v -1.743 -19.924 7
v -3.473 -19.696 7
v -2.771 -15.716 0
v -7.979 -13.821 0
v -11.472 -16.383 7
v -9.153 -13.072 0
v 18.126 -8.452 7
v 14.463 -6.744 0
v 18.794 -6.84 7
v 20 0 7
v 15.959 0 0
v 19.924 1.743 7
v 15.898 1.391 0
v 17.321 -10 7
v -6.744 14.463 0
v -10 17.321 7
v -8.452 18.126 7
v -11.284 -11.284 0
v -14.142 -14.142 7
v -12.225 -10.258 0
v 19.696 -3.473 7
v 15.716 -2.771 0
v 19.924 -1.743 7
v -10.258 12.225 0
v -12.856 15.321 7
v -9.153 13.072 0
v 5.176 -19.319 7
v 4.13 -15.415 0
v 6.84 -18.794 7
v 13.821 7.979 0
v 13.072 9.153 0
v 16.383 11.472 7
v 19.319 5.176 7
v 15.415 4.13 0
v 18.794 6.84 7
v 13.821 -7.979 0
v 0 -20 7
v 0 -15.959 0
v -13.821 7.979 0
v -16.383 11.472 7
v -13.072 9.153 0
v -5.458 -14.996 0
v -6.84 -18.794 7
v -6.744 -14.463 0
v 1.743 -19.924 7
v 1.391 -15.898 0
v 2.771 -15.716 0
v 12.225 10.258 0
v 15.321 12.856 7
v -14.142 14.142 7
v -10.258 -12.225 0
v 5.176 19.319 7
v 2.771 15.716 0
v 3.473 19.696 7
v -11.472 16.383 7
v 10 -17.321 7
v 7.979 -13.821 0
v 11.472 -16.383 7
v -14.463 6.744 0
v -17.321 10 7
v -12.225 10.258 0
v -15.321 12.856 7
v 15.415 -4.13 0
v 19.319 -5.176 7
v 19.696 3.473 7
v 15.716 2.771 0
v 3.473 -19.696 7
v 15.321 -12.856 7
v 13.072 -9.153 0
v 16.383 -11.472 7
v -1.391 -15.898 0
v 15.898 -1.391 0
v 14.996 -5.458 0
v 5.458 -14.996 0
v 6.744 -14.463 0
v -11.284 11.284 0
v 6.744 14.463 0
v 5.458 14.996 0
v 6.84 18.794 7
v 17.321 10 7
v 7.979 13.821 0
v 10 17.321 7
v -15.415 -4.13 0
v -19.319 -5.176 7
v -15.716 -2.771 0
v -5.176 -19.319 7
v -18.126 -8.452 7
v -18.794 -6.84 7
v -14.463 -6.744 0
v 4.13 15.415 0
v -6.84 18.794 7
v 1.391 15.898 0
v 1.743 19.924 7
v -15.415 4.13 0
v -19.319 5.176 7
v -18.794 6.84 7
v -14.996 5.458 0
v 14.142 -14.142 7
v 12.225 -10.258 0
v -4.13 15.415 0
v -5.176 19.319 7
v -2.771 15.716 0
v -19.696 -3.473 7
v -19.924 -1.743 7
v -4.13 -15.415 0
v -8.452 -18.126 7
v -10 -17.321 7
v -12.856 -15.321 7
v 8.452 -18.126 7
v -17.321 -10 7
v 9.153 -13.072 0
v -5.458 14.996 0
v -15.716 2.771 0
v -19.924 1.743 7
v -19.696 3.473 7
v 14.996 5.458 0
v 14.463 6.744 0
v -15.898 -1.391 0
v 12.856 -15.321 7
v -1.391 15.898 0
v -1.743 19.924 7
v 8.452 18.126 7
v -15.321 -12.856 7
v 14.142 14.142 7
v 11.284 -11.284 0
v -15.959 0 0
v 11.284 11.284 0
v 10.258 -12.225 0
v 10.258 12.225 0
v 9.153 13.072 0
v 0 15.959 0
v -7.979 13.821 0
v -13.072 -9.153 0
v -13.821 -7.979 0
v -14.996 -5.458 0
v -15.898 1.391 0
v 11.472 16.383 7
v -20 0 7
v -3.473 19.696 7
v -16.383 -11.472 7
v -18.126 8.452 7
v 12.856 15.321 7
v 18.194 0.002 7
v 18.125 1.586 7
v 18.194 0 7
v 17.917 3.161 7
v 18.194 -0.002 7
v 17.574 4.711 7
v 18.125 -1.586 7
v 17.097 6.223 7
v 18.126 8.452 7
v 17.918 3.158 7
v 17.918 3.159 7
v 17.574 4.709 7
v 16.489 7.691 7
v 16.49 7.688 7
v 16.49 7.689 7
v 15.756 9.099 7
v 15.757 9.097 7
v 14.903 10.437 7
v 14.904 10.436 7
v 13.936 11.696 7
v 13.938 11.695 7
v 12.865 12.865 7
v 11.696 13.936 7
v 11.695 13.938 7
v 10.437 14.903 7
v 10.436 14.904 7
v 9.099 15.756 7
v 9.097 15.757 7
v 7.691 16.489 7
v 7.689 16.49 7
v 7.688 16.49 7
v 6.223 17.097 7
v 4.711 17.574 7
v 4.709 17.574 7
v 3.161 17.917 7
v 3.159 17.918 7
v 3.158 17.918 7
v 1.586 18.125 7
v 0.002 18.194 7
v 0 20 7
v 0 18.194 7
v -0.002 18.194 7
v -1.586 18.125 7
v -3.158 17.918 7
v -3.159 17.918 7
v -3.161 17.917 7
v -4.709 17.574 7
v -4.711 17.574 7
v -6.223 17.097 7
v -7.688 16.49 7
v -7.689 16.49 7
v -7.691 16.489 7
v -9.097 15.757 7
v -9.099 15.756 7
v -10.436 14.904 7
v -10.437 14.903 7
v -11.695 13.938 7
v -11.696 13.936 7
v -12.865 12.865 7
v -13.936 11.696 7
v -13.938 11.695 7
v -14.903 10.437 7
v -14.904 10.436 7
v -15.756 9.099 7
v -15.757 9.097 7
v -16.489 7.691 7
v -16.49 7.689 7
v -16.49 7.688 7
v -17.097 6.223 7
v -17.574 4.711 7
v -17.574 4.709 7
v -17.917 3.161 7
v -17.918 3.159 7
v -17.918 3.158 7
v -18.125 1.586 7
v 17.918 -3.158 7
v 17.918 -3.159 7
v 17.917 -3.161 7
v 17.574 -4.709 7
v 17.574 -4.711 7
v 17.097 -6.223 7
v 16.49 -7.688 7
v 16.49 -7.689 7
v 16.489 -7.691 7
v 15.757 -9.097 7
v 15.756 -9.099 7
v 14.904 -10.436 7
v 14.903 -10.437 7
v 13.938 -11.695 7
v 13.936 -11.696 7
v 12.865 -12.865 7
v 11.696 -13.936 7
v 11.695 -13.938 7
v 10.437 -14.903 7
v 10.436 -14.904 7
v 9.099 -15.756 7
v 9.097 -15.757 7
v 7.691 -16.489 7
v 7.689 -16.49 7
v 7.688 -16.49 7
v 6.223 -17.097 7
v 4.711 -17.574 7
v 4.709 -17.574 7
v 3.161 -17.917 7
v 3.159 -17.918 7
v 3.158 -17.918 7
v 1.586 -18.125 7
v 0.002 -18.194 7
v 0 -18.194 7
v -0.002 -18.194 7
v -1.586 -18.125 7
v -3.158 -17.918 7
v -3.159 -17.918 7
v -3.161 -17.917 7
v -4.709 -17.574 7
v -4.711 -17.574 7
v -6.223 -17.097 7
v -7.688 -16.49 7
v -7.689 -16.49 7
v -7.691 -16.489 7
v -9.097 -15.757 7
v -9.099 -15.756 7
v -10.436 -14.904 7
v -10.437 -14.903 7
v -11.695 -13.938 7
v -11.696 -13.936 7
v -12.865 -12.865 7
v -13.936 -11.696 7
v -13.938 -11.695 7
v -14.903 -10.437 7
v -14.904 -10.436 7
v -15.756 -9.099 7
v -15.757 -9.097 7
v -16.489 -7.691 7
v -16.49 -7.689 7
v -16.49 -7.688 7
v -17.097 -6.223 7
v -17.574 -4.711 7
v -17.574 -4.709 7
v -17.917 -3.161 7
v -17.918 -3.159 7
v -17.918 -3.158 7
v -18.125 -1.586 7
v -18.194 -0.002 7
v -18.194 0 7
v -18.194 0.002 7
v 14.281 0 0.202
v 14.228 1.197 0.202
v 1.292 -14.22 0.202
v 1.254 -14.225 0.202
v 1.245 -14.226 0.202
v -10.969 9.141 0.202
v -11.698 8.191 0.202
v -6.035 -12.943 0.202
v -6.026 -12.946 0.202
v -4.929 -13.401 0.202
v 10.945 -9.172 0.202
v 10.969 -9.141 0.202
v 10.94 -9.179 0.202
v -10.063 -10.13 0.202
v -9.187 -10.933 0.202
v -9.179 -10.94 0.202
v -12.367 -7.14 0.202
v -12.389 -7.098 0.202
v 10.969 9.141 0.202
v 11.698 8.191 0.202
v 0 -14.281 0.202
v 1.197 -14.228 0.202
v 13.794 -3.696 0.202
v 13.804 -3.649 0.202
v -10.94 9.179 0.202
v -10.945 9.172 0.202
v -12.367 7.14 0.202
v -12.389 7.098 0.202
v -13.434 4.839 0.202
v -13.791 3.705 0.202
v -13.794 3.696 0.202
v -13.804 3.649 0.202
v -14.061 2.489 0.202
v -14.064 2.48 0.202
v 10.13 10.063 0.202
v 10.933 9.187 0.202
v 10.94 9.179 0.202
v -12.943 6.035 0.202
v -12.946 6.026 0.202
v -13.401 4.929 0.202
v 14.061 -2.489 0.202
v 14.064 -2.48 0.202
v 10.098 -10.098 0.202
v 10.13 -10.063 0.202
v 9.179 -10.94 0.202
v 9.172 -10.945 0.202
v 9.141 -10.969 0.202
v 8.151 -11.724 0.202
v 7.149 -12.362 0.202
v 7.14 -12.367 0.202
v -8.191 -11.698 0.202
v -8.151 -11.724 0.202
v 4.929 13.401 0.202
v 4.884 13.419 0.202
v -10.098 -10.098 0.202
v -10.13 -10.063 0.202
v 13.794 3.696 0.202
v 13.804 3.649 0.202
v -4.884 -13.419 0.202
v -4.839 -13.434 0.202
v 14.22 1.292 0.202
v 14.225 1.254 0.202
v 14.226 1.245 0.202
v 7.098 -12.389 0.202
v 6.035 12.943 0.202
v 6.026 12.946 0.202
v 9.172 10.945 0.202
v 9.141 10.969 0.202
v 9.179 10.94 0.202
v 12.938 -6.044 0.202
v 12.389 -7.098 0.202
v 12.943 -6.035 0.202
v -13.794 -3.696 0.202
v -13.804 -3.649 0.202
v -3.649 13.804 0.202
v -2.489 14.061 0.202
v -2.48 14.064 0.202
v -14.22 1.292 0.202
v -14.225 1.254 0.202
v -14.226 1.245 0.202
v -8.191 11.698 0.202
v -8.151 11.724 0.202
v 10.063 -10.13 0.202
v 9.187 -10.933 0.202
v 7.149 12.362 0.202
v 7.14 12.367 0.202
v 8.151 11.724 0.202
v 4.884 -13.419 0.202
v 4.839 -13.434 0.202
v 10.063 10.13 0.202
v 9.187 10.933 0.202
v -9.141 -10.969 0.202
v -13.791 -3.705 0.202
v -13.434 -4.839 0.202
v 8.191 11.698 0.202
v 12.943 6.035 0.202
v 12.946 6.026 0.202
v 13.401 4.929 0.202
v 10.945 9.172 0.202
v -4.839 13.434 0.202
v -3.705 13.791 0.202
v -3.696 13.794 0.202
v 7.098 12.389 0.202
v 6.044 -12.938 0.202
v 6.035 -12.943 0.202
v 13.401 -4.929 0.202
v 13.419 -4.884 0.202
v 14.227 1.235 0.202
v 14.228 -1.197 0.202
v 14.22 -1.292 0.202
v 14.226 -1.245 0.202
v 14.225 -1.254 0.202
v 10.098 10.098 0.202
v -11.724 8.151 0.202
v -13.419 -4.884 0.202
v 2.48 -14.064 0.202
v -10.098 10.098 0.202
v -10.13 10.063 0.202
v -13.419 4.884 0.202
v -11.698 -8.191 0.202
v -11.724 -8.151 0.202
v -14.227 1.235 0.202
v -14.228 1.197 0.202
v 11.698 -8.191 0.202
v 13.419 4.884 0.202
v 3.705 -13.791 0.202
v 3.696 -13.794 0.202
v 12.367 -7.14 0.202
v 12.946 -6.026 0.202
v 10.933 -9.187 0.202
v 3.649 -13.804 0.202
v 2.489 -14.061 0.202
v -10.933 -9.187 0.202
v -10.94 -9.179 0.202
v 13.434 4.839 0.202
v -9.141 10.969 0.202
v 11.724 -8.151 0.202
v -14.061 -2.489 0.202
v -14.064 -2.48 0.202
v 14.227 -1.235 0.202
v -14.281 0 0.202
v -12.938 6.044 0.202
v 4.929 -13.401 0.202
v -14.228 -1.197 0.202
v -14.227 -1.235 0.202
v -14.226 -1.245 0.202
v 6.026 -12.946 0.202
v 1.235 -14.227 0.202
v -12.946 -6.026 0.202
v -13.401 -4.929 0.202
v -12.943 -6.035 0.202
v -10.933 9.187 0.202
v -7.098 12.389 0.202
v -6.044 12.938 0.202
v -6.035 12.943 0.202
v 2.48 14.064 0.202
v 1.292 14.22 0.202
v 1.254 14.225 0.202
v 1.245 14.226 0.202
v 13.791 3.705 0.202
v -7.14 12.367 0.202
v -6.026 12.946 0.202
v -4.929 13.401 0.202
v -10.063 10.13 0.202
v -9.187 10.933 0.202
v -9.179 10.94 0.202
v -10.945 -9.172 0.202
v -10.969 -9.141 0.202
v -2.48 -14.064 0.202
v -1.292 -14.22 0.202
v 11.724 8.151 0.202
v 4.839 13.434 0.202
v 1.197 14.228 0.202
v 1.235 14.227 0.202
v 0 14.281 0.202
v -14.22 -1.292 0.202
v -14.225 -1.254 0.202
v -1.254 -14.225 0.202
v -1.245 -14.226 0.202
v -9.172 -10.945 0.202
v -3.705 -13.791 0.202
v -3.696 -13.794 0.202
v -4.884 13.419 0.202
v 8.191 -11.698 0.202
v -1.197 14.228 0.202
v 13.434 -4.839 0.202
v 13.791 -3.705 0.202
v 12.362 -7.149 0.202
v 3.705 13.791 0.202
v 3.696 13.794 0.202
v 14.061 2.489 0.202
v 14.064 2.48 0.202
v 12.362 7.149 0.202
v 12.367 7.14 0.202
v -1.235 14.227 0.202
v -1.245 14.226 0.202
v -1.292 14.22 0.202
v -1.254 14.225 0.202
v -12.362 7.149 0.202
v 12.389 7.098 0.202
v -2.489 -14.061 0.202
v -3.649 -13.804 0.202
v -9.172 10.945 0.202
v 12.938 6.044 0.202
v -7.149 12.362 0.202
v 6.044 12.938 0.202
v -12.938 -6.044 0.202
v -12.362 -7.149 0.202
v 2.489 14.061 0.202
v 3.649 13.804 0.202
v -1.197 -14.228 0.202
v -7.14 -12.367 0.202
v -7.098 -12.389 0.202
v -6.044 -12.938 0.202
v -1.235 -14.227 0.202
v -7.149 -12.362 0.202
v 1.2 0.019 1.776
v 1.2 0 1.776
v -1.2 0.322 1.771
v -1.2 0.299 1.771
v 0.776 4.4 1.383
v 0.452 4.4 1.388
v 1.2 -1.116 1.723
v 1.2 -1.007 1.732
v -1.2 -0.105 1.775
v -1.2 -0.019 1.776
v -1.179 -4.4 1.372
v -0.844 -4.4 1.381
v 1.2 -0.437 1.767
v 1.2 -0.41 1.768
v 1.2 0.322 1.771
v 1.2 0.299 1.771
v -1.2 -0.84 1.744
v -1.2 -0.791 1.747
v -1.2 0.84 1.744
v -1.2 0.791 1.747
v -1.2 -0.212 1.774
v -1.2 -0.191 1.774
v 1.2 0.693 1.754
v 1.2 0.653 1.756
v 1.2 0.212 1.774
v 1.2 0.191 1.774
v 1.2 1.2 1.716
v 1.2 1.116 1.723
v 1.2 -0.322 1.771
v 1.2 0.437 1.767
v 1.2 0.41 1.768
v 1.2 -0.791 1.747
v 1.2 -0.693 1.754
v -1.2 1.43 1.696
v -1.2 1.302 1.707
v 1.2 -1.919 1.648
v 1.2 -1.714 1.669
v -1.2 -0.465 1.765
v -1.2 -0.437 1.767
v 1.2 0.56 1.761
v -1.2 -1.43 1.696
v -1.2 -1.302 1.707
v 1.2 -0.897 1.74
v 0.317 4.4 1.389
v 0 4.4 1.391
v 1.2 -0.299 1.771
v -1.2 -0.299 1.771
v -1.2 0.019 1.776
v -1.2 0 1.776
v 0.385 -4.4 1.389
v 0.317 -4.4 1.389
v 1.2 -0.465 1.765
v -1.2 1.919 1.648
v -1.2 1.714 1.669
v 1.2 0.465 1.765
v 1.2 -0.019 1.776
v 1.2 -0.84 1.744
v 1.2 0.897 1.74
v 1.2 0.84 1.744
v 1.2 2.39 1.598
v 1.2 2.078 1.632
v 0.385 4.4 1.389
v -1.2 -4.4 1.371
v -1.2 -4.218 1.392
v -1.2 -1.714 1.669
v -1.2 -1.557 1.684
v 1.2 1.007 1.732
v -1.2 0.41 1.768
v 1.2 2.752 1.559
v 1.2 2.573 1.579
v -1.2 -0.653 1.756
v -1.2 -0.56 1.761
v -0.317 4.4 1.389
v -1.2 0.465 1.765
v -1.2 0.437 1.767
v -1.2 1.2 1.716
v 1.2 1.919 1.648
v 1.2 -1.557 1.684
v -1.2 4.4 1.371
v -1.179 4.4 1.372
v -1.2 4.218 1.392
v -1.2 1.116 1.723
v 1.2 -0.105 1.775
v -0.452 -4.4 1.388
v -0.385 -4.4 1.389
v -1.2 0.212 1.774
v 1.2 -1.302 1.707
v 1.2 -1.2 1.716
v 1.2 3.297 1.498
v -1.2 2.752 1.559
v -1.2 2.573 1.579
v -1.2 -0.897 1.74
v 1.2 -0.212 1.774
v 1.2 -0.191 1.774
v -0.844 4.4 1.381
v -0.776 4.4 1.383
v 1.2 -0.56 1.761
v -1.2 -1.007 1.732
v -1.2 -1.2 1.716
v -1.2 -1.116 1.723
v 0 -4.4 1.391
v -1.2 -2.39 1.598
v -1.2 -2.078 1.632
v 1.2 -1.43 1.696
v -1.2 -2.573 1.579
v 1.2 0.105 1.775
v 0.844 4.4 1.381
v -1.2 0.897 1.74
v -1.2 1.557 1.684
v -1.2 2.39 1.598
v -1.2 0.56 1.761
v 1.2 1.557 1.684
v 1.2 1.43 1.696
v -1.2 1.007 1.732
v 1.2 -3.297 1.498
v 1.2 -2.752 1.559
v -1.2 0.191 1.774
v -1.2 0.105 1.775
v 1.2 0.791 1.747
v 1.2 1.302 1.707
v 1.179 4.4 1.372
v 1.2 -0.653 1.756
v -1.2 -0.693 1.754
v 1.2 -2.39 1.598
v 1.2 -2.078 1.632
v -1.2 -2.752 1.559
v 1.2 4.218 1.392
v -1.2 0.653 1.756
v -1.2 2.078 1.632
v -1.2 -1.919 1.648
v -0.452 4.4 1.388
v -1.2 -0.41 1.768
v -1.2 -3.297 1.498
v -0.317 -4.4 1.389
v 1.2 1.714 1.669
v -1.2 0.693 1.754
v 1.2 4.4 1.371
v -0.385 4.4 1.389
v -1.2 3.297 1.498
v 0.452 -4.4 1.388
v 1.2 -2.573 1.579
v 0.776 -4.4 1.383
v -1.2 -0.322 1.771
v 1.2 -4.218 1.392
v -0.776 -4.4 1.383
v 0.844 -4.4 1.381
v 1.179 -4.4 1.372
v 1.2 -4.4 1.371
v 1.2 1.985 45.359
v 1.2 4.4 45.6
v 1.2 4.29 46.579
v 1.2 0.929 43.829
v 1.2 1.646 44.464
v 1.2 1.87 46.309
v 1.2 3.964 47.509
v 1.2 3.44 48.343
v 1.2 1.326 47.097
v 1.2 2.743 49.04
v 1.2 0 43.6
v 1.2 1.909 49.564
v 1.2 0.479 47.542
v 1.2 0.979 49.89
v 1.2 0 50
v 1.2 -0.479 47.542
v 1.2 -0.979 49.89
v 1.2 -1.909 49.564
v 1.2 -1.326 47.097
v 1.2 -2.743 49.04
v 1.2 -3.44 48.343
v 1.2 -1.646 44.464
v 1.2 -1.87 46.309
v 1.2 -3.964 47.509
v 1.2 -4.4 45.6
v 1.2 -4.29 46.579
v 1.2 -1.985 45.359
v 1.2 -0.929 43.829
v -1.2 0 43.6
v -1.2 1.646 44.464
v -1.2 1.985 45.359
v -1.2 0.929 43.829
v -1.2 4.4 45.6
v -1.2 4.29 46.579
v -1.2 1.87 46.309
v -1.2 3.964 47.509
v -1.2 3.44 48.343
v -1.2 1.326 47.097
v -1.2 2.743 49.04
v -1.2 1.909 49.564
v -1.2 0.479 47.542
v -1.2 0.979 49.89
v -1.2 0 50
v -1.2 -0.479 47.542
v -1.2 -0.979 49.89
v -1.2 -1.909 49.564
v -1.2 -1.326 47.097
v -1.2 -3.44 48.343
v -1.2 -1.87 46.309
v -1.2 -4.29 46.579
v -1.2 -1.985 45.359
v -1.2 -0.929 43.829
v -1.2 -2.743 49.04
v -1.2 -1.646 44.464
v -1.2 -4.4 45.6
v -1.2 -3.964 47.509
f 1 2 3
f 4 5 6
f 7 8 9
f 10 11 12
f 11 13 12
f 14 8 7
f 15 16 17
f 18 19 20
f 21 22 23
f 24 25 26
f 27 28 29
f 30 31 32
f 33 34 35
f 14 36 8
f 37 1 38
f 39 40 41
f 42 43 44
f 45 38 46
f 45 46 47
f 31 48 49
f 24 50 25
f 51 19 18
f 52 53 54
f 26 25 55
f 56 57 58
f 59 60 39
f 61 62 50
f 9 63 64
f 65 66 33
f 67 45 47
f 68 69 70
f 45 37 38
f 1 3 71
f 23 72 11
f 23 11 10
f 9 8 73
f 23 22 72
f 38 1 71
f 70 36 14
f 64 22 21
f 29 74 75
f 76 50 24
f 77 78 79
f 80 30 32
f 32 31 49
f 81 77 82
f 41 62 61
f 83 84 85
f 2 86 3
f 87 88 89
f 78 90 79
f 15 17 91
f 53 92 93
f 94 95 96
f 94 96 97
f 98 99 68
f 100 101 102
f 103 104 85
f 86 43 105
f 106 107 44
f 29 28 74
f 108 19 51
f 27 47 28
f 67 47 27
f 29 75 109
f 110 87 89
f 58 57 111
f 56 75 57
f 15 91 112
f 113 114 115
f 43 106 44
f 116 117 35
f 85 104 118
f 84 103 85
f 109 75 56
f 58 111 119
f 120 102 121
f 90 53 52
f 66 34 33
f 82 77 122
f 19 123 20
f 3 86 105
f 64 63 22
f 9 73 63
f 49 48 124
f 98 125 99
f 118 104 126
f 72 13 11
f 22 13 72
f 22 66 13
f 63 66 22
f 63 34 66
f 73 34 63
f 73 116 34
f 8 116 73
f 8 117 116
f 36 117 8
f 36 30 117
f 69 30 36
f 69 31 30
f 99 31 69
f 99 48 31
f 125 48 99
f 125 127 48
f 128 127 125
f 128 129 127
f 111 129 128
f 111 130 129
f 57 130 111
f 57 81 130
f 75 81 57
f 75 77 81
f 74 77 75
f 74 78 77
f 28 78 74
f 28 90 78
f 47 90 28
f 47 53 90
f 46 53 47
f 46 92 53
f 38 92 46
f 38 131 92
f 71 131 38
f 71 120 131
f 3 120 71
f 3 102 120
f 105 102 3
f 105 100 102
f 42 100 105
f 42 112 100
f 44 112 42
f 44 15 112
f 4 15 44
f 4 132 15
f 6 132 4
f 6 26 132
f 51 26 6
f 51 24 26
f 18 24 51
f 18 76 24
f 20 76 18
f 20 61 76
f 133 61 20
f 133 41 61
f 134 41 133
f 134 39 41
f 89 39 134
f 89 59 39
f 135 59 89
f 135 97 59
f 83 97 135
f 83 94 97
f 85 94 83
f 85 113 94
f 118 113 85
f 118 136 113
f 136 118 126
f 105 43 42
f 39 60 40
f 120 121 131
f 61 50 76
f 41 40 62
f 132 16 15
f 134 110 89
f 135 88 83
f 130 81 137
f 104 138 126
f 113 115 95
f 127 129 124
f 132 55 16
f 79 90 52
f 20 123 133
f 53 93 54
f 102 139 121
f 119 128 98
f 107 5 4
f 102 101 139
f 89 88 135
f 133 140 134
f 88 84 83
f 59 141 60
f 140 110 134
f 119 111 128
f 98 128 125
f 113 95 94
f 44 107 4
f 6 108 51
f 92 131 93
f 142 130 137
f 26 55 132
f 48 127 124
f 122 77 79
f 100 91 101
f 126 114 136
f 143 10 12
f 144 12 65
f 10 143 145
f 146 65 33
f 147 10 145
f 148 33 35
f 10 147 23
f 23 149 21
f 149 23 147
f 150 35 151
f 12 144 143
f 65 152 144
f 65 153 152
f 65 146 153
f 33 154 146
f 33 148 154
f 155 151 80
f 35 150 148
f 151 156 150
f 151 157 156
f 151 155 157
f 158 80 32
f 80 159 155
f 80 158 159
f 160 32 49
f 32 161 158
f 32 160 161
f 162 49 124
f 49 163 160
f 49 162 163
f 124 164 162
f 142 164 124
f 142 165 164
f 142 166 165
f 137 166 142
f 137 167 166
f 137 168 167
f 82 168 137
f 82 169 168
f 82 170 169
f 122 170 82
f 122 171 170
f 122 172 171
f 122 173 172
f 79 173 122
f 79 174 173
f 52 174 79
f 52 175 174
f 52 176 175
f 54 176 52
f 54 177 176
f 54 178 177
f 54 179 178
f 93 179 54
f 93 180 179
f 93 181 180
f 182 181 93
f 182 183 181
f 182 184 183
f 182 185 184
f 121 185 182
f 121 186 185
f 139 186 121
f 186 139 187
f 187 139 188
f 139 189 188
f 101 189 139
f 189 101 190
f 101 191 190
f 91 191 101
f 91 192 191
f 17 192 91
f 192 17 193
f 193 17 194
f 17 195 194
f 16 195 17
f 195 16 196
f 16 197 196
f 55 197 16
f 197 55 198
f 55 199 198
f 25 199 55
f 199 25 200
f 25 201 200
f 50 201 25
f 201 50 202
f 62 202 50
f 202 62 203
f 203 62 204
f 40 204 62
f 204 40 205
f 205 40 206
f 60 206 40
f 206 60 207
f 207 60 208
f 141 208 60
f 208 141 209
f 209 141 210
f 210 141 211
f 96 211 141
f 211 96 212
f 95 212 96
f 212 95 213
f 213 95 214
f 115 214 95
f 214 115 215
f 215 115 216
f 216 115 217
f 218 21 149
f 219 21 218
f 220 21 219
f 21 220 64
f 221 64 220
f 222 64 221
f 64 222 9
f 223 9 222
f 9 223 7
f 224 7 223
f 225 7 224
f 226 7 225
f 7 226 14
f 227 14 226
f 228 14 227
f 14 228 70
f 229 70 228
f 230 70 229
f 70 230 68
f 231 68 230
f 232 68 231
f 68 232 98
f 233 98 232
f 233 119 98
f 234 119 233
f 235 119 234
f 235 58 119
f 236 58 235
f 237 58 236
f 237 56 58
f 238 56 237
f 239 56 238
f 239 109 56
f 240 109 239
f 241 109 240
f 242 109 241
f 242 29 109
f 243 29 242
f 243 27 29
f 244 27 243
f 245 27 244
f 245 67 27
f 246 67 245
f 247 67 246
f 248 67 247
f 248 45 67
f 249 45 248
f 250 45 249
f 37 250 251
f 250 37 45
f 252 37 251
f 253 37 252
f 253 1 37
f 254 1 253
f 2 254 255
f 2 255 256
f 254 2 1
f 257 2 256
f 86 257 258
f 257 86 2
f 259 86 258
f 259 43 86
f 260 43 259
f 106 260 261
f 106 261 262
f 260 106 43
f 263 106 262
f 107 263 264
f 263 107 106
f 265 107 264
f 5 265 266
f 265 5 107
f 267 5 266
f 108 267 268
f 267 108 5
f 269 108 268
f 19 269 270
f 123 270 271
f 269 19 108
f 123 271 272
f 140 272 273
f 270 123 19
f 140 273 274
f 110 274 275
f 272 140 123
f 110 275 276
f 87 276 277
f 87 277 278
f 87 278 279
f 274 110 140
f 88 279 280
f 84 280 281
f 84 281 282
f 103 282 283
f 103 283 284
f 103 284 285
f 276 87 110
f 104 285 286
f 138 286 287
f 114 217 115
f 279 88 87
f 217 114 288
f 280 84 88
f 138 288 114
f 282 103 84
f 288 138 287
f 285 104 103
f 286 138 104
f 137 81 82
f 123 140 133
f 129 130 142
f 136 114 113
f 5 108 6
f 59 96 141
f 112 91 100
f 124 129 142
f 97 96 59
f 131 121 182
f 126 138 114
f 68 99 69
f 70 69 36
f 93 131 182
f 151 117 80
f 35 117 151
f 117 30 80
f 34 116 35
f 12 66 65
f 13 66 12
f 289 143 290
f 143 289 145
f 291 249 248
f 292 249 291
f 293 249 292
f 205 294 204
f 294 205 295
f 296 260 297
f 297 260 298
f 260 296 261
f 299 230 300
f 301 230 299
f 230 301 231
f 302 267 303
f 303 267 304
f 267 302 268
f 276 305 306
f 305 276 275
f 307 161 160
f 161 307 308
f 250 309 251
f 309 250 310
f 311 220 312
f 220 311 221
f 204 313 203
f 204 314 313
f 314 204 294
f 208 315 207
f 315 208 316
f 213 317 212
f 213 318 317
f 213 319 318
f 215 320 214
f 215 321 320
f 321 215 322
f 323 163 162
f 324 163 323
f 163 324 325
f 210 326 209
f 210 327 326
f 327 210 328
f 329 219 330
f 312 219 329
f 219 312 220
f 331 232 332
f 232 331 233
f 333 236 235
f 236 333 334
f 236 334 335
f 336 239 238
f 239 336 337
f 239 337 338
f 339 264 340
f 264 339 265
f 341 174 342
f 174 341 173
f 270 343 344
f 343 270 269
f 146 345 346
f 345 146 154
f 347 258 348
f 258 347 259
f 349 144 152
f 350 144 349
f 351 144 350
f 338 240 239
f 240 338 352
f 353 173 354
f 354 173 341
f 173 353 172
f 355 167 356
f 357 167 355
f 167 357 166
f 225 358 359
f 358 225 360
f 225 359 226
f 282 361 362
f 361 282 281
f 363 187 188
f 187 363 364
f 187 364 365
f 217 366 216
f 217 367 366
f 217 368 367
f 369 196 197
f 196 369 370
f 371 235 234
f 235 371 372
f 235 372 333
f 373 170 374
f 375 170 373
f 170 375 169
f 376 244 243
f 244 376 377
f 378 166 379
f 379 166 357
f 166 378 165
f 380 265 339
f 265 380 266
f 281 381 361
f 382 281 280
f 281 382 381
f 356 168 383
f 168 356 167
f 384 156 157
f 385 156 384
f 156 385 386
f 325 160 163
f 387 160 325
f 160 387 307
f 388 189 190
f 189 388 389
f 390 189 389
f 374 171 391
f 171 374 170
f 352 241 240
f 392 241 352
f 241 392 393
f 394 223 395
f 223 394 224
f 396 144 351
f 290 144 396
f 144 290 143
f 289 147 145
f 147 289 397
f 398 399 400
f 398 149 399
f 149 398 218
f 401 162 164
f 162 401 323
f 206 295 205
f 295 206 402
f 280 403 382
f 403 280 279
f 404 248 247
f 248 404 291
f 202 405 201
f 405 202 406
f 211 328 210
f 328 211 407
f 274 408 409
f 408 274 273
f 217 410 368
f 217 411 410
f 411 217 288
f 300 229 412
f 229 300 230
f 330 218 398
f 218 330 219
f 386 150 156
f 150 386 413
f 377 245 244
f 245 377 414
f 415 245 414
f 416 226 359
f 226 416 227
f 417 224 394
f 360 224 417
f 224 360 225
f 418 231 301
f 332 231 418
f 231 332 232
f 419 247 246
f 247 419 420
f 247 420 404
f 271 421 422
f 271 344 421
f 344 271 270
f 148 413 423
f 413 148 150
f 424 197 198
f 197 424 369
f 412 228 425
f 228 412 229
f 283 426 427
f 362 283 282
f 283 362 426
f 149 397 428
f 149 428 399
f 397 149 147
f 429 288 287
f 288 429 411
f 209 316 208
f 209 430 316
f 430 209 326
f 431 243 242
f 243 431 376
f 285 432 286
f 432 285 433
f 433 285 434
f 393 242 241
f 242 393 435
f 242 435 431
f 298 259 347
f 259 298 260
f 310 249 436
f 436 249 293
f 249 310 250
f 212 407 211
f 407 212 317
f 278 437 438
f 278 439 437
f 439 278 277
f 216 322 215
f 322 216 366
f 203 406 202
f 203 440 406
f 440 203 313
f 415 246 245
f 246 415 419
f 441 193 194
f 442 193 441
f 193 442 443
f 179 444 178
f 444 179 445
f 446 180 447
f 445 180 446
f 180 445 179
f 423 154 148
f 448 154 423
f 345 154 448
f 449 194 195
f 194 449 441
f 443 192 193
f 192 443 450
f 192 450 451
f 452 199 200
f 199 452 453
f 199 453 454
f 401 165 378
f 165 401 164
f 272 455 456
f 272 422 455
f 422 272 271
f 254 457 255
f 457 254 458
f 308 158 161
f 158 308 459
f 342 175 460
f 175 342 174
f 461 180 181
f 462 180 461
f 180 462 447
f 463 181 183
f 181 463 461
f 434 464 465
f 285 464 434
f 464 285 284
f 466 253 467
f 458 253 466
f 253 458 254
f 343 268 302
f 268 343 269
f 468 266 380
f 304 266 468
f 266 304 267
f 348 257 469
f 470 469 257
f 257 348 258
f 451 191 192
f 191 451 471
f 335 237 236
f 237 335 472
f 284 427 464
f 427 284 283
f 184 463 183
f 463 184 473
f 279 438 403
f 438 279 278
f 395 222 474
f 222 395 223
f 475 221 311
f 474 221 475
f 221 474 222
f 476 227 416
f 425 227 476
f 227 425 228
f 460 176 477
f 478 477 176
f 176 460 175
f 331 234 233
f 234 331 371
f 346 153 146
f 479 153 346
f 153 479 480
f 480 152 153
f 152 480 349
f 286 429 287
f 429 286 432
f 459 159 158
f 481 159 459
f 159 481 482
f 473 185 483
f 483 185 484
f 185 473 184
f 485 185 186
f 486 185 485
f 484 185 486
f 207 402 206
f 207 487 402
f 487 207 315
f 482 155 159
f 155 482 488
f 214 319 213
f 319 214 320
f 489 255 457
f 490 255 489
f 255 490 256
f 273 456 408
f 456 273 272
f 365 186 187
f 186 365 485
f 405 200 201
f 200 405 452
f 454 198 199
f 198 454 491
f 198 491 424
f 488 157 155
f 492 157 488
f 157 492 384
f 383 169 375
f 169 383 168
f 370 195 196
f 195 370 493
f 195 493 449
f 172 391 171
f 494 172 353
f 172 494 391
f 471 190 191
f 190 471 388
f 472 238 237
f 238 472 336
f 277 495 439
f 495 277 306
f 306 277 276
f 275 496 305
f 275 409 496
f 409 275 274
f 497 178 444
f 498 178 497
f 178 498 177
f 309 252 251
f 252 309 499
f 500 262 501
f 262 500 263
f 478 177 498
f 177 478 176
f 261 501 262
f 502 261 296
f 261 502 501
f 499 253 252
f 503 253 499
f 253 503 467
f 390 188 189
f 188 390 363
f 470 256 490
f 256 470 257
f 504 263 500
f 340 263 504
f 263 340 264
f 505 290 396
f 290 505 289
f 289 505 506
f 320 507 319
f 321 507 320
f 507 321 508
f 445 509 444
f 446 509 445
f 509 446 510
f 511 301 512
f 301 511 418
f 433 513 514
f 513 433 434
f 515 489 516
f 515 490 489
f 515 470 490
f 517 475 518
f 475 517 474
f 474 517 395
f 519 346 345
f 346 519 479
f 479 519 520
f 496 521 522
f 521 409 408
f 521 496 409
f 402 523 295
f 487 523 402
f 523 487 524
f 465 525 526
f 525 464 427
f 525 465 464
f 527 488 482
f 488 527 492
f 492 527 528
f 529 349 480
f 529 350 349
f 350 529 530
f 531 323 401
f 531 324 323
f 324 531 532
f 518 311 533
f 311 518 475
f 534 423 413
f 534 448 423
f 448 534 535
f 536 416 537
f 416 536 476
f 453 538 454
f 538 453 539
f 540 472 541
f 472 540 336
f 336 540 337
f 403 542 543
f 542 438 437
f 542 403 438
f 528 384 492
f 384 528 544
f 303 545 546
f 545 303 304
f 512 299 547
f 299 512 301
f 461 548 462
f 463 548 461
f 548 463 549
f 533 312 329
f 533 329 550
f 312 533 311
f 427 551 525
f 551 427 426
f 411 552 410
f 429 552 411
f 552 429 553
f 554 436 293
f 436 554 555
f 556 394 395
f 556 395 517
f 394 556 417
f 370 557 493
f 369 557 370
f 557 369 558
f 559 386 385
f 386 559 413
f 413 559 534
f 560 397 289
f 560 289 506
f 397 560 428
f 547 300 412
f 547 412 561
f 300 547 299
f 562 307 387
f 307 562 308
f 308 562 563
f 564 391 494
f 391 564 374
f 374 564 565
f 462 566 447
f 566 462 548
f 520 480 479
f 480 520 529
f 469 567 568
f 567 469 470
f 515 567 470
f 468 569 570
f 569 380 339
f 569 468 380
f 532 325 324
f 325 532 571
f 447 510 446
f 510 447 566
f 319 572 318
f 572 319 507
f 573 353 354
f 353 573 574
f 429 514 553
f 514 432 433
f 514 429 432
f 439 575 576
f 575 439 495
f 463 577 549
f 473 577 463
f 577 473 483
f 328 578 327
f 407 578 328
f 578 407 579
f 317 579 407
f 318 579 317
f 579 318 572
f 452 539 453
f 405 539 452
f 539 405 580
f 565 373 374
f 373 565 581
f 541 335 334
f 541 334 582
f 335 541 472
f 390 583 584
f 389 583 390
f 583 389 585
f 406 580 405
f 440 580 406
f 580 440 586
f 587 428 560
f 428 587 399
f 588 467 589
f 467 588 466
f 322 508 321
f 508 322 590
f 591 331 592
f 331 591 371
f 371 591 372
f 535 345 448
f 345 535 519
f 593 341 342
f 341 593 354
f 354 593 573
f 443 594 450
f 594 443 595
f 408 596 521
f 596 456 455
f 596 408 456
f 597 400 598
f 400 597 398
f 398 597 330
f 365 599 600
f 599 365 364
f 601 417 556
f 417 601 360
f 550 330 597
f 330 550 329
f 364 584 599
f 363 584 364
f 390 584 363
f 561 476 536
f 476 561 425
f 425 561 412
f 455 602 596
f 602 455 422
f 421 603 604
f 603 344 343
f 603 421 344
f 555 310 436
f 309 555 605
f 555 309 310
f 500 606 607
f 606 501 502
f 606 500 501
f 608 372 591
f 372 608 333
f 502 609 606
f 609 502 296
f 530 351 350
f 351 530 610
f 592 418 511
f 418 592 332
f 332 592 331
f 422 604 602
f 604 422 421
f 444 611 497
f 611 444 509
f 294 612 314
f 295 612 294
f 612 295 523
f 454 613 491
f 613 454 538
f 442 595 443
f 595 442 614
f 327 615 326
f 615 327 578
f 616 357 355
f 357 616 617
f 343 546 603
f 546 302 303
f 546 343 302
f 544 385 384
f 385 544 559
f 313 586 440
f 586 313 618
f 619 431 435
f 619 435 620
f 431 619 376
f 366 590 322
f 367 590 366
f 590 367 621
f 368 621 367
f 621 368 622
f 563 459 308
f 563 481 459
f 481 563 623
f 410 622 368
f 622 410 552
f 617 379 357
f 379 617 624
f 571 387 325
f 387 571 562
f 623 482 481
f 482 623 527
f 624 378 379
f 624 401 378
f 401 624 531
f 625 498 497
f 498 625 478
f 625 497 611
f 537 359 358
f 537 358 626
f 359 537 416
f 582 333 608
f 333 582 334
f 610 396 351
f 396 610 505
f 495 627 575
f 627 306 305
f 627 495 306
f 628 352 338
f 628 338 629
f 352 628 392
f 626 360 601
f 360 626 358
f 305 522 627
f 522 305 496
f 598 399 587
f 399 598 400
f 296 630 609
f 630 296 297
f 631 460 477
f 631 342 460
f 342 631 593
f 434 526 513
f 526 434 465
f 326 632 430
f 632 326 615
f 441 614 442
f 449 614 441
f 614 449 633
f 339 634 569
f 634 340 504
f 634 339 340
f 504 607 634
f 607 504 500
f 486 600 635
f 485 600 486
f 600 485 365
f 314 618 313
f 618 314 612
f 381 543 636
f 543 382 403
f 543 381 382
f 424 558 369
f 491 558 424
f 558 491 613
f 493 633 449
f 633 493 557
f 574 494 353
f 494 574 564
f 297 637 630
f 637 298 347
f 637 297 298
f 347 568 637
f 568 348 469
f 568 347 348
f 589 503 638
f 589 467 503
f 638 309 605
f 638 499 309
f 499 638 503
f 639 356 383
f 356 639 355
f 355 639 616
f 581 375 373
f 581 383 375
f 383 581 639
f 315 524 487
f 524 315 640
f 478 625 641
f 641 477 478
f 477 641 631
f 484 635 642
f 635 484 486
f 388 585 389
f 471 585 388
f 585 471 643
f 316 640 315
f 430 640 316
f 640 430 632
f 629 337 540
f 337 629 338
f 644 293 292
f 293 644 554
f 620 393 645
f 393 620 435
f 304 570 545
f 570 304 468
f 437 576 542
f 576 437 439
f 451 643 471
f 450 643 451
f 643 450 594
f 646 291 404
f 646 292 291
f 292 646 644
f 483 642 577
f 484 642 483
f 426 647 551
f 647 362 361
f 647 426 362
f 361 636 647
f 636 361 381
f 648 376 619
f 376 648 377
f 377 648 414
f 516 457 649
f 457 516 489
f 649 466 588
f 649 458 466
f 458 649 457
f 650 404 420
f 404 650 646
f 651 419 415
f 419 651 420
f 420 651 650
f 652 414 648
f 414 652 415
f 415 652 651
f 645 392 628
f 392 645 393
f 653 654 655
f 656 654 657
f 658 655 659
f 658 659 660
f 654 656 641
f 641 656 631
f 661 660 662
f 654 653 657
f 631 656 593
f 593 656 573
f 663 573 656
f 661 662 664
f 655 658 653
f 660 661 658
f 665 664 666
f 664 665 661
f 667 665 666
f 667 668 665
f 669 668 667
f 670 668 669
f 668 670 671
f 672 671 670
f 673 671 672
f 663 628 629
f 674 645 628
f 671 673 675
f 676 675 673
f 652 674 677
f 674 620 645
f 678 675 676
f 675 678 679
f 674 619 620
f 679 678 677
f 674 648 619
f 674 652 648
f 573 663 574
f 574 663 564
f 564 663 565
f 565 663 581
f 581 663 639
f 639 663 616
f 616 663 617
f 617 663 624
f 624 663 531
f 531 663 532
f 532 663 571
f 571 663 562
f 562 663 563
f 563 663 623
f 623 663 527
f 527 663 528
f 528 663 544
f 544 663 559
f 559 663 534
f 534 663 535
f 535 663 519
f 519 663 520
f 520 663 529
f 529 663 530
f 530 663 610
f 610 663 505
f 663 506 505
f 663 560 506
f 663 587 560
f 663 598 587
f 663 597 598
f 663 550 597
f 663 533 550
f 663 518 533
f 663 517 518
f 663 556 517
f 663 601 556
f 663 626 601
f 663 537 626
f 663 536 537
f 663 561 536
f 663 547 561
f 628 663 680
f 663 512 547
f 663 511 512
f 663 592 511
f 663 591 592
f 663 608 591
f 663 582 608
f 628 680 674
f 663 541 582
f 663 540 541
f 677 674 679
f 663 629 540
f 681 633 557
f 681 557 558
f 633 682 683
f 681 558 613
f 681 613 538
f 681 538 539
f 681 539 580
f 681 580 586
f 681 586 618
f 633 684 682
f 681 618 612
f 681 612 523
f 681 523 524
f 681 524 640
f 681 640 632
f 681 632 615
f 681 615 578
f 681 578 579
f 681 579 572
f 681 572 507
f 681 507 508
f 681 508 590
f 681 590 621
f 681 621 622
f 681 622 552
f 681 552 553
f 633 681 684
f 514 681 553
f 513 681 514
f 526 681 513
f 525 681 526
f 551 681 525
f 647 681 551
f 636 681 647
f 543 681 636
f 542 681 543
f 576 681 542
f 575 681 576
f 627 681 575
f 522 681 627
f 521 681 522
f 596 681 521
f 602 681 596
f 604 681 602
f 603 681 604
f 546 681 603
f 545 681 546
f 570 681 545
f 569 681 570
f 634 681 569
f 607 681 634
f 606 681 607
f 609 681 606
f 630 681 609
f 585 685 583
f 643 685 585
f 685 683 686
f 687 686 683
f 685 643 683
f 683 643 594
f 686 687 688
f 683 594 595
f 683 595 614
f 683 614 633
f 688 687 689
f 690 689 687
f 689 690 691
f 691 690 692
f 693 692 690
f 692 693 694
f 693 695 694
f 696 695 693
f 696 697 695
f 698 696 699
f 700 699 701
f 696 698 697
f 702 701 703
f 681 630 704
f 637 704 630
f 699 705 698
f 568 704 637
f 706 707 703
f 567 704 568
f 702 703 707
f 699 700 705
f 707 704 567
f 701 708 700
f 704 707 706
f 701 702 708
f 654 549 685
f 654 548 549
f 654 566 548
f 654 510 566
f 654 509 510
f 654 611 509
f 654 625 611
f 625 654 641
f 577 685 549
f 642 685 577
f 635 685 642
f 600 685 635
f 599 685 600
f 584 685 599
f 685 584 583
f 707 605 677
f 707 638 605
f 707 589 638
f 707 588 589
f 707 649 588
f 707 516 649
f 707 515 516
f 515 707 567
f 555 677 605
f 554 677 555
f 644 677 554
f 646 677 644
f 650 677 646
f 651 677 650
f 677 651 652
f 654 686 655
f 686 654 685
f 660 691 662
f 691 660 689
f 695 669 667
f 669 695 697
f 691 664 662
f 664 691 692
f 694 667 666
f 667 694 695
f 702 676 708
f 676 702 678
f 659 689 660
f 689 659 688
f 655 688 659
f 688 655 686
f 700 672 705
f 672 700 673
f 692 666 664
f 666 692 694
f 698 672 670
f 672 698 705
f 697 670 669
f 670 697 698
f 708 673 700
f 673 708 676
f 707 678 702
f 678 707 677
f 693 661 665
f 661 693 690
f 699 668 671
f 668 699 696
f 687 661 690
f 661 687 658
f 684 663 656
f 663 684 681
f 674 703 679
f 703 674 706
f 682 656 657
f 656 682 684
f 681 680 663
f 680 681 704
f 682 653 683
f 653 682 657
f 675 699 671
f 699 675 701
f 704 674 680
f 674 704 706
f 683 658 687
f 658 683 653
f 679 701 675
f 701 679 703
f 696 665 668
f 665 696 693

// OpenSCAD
// -*- mode: SCAD ; c-file-style: "ellemtel" ; coding: utf-8 -*-
//
// simple, functional model mushroom anchor
//
// © 2018 Roland Sieker <ospalh@gmail.com>
// Licence: CC-BY-SA 4.0

// Radius of the cap
r = 20;

// size of the “chain” hole
hl = 4;

// Set this to “render” and click on “Create Thing” when done with the setup.
preview = 1; // [0:render, 1:preview]



/* [Hidden] */

// Done with the customizer

// *******************************************************
// Extra parameters. These can be changed reasonably safely.

l_to_r = 2.5;  // Length of the stem in rs
r_to_h = 0.35;

w = 2.4;  // Wall width
p = 1.8; // cap width
c = 0.4;  // Clearance
angle = 60; // Overhangs much below 60° are a problem for me

// *******************************************************
// Some shortcuts. These shouldn’t be changed

tau = 2 * PI;  // π is still wrong. τ = ⌀ ÷ r

xy_factor = 1/tan(angle);
// To get from a height to a horizontal width inclined correctly
z_factor = tan(angle);  // The other way around


h = r * r_to_h;
r_i = r - h * xy_factor;
l = r * l_to_r;


some_distance = 50;
ms = 0.01;  // Muggeseggele.

// fn for differently sized objects and fs, fa; all for preview or rendering.
pna = 40;
pnb = 15;
pa = 5;
ps = 1;
rna = 180;
rnb = 30;
ra = 1;
rs = 0.1;
function na() = (preview) ? pna : rna;
function nb() = (preview) ? pnb : rnb;
$fs = (preview) ? ps : rs;
$fa = (preview) ? pa : ra;

// *******************************************************
// End setup



// *******************************************************
// Generate the part

mushroom_anchor();



// *******************************************************
// Code for the parts themselves

module mushroom_anchor()
{
   anchor_cap();
   anchor_stem();
}

module anchor_cap()
{
   difference()
   {
      cylinder(r1=r_i, r2=r, h=h);
      translate([0, 0, -ms])
      {
         cylinder(r1=r_i-p, r2=r-p, h=h+2*ms);
      }
   }
   cylinder(r1=r_i, h=p);
}

module anchor_stem()
{
   le = l - w  - hl/2;
   difference()
   {
      union()
      {
         translate([0,0,le/2])
         {
            cube([w,2*w+hl,le], center=true);
         }

         translate([0, 0, le])
         {
            rotate([0, 90, 0])
            {
               cylinder(r=w+hl/2, h=w, center=true);
            }
         }
      }
      translate([0, 0, le])
      {
         rotate([0, 90, 0])
         {
            cylinder(r=hl/2, h=w+2*ms, center=true);
         }
      }
   }
}
